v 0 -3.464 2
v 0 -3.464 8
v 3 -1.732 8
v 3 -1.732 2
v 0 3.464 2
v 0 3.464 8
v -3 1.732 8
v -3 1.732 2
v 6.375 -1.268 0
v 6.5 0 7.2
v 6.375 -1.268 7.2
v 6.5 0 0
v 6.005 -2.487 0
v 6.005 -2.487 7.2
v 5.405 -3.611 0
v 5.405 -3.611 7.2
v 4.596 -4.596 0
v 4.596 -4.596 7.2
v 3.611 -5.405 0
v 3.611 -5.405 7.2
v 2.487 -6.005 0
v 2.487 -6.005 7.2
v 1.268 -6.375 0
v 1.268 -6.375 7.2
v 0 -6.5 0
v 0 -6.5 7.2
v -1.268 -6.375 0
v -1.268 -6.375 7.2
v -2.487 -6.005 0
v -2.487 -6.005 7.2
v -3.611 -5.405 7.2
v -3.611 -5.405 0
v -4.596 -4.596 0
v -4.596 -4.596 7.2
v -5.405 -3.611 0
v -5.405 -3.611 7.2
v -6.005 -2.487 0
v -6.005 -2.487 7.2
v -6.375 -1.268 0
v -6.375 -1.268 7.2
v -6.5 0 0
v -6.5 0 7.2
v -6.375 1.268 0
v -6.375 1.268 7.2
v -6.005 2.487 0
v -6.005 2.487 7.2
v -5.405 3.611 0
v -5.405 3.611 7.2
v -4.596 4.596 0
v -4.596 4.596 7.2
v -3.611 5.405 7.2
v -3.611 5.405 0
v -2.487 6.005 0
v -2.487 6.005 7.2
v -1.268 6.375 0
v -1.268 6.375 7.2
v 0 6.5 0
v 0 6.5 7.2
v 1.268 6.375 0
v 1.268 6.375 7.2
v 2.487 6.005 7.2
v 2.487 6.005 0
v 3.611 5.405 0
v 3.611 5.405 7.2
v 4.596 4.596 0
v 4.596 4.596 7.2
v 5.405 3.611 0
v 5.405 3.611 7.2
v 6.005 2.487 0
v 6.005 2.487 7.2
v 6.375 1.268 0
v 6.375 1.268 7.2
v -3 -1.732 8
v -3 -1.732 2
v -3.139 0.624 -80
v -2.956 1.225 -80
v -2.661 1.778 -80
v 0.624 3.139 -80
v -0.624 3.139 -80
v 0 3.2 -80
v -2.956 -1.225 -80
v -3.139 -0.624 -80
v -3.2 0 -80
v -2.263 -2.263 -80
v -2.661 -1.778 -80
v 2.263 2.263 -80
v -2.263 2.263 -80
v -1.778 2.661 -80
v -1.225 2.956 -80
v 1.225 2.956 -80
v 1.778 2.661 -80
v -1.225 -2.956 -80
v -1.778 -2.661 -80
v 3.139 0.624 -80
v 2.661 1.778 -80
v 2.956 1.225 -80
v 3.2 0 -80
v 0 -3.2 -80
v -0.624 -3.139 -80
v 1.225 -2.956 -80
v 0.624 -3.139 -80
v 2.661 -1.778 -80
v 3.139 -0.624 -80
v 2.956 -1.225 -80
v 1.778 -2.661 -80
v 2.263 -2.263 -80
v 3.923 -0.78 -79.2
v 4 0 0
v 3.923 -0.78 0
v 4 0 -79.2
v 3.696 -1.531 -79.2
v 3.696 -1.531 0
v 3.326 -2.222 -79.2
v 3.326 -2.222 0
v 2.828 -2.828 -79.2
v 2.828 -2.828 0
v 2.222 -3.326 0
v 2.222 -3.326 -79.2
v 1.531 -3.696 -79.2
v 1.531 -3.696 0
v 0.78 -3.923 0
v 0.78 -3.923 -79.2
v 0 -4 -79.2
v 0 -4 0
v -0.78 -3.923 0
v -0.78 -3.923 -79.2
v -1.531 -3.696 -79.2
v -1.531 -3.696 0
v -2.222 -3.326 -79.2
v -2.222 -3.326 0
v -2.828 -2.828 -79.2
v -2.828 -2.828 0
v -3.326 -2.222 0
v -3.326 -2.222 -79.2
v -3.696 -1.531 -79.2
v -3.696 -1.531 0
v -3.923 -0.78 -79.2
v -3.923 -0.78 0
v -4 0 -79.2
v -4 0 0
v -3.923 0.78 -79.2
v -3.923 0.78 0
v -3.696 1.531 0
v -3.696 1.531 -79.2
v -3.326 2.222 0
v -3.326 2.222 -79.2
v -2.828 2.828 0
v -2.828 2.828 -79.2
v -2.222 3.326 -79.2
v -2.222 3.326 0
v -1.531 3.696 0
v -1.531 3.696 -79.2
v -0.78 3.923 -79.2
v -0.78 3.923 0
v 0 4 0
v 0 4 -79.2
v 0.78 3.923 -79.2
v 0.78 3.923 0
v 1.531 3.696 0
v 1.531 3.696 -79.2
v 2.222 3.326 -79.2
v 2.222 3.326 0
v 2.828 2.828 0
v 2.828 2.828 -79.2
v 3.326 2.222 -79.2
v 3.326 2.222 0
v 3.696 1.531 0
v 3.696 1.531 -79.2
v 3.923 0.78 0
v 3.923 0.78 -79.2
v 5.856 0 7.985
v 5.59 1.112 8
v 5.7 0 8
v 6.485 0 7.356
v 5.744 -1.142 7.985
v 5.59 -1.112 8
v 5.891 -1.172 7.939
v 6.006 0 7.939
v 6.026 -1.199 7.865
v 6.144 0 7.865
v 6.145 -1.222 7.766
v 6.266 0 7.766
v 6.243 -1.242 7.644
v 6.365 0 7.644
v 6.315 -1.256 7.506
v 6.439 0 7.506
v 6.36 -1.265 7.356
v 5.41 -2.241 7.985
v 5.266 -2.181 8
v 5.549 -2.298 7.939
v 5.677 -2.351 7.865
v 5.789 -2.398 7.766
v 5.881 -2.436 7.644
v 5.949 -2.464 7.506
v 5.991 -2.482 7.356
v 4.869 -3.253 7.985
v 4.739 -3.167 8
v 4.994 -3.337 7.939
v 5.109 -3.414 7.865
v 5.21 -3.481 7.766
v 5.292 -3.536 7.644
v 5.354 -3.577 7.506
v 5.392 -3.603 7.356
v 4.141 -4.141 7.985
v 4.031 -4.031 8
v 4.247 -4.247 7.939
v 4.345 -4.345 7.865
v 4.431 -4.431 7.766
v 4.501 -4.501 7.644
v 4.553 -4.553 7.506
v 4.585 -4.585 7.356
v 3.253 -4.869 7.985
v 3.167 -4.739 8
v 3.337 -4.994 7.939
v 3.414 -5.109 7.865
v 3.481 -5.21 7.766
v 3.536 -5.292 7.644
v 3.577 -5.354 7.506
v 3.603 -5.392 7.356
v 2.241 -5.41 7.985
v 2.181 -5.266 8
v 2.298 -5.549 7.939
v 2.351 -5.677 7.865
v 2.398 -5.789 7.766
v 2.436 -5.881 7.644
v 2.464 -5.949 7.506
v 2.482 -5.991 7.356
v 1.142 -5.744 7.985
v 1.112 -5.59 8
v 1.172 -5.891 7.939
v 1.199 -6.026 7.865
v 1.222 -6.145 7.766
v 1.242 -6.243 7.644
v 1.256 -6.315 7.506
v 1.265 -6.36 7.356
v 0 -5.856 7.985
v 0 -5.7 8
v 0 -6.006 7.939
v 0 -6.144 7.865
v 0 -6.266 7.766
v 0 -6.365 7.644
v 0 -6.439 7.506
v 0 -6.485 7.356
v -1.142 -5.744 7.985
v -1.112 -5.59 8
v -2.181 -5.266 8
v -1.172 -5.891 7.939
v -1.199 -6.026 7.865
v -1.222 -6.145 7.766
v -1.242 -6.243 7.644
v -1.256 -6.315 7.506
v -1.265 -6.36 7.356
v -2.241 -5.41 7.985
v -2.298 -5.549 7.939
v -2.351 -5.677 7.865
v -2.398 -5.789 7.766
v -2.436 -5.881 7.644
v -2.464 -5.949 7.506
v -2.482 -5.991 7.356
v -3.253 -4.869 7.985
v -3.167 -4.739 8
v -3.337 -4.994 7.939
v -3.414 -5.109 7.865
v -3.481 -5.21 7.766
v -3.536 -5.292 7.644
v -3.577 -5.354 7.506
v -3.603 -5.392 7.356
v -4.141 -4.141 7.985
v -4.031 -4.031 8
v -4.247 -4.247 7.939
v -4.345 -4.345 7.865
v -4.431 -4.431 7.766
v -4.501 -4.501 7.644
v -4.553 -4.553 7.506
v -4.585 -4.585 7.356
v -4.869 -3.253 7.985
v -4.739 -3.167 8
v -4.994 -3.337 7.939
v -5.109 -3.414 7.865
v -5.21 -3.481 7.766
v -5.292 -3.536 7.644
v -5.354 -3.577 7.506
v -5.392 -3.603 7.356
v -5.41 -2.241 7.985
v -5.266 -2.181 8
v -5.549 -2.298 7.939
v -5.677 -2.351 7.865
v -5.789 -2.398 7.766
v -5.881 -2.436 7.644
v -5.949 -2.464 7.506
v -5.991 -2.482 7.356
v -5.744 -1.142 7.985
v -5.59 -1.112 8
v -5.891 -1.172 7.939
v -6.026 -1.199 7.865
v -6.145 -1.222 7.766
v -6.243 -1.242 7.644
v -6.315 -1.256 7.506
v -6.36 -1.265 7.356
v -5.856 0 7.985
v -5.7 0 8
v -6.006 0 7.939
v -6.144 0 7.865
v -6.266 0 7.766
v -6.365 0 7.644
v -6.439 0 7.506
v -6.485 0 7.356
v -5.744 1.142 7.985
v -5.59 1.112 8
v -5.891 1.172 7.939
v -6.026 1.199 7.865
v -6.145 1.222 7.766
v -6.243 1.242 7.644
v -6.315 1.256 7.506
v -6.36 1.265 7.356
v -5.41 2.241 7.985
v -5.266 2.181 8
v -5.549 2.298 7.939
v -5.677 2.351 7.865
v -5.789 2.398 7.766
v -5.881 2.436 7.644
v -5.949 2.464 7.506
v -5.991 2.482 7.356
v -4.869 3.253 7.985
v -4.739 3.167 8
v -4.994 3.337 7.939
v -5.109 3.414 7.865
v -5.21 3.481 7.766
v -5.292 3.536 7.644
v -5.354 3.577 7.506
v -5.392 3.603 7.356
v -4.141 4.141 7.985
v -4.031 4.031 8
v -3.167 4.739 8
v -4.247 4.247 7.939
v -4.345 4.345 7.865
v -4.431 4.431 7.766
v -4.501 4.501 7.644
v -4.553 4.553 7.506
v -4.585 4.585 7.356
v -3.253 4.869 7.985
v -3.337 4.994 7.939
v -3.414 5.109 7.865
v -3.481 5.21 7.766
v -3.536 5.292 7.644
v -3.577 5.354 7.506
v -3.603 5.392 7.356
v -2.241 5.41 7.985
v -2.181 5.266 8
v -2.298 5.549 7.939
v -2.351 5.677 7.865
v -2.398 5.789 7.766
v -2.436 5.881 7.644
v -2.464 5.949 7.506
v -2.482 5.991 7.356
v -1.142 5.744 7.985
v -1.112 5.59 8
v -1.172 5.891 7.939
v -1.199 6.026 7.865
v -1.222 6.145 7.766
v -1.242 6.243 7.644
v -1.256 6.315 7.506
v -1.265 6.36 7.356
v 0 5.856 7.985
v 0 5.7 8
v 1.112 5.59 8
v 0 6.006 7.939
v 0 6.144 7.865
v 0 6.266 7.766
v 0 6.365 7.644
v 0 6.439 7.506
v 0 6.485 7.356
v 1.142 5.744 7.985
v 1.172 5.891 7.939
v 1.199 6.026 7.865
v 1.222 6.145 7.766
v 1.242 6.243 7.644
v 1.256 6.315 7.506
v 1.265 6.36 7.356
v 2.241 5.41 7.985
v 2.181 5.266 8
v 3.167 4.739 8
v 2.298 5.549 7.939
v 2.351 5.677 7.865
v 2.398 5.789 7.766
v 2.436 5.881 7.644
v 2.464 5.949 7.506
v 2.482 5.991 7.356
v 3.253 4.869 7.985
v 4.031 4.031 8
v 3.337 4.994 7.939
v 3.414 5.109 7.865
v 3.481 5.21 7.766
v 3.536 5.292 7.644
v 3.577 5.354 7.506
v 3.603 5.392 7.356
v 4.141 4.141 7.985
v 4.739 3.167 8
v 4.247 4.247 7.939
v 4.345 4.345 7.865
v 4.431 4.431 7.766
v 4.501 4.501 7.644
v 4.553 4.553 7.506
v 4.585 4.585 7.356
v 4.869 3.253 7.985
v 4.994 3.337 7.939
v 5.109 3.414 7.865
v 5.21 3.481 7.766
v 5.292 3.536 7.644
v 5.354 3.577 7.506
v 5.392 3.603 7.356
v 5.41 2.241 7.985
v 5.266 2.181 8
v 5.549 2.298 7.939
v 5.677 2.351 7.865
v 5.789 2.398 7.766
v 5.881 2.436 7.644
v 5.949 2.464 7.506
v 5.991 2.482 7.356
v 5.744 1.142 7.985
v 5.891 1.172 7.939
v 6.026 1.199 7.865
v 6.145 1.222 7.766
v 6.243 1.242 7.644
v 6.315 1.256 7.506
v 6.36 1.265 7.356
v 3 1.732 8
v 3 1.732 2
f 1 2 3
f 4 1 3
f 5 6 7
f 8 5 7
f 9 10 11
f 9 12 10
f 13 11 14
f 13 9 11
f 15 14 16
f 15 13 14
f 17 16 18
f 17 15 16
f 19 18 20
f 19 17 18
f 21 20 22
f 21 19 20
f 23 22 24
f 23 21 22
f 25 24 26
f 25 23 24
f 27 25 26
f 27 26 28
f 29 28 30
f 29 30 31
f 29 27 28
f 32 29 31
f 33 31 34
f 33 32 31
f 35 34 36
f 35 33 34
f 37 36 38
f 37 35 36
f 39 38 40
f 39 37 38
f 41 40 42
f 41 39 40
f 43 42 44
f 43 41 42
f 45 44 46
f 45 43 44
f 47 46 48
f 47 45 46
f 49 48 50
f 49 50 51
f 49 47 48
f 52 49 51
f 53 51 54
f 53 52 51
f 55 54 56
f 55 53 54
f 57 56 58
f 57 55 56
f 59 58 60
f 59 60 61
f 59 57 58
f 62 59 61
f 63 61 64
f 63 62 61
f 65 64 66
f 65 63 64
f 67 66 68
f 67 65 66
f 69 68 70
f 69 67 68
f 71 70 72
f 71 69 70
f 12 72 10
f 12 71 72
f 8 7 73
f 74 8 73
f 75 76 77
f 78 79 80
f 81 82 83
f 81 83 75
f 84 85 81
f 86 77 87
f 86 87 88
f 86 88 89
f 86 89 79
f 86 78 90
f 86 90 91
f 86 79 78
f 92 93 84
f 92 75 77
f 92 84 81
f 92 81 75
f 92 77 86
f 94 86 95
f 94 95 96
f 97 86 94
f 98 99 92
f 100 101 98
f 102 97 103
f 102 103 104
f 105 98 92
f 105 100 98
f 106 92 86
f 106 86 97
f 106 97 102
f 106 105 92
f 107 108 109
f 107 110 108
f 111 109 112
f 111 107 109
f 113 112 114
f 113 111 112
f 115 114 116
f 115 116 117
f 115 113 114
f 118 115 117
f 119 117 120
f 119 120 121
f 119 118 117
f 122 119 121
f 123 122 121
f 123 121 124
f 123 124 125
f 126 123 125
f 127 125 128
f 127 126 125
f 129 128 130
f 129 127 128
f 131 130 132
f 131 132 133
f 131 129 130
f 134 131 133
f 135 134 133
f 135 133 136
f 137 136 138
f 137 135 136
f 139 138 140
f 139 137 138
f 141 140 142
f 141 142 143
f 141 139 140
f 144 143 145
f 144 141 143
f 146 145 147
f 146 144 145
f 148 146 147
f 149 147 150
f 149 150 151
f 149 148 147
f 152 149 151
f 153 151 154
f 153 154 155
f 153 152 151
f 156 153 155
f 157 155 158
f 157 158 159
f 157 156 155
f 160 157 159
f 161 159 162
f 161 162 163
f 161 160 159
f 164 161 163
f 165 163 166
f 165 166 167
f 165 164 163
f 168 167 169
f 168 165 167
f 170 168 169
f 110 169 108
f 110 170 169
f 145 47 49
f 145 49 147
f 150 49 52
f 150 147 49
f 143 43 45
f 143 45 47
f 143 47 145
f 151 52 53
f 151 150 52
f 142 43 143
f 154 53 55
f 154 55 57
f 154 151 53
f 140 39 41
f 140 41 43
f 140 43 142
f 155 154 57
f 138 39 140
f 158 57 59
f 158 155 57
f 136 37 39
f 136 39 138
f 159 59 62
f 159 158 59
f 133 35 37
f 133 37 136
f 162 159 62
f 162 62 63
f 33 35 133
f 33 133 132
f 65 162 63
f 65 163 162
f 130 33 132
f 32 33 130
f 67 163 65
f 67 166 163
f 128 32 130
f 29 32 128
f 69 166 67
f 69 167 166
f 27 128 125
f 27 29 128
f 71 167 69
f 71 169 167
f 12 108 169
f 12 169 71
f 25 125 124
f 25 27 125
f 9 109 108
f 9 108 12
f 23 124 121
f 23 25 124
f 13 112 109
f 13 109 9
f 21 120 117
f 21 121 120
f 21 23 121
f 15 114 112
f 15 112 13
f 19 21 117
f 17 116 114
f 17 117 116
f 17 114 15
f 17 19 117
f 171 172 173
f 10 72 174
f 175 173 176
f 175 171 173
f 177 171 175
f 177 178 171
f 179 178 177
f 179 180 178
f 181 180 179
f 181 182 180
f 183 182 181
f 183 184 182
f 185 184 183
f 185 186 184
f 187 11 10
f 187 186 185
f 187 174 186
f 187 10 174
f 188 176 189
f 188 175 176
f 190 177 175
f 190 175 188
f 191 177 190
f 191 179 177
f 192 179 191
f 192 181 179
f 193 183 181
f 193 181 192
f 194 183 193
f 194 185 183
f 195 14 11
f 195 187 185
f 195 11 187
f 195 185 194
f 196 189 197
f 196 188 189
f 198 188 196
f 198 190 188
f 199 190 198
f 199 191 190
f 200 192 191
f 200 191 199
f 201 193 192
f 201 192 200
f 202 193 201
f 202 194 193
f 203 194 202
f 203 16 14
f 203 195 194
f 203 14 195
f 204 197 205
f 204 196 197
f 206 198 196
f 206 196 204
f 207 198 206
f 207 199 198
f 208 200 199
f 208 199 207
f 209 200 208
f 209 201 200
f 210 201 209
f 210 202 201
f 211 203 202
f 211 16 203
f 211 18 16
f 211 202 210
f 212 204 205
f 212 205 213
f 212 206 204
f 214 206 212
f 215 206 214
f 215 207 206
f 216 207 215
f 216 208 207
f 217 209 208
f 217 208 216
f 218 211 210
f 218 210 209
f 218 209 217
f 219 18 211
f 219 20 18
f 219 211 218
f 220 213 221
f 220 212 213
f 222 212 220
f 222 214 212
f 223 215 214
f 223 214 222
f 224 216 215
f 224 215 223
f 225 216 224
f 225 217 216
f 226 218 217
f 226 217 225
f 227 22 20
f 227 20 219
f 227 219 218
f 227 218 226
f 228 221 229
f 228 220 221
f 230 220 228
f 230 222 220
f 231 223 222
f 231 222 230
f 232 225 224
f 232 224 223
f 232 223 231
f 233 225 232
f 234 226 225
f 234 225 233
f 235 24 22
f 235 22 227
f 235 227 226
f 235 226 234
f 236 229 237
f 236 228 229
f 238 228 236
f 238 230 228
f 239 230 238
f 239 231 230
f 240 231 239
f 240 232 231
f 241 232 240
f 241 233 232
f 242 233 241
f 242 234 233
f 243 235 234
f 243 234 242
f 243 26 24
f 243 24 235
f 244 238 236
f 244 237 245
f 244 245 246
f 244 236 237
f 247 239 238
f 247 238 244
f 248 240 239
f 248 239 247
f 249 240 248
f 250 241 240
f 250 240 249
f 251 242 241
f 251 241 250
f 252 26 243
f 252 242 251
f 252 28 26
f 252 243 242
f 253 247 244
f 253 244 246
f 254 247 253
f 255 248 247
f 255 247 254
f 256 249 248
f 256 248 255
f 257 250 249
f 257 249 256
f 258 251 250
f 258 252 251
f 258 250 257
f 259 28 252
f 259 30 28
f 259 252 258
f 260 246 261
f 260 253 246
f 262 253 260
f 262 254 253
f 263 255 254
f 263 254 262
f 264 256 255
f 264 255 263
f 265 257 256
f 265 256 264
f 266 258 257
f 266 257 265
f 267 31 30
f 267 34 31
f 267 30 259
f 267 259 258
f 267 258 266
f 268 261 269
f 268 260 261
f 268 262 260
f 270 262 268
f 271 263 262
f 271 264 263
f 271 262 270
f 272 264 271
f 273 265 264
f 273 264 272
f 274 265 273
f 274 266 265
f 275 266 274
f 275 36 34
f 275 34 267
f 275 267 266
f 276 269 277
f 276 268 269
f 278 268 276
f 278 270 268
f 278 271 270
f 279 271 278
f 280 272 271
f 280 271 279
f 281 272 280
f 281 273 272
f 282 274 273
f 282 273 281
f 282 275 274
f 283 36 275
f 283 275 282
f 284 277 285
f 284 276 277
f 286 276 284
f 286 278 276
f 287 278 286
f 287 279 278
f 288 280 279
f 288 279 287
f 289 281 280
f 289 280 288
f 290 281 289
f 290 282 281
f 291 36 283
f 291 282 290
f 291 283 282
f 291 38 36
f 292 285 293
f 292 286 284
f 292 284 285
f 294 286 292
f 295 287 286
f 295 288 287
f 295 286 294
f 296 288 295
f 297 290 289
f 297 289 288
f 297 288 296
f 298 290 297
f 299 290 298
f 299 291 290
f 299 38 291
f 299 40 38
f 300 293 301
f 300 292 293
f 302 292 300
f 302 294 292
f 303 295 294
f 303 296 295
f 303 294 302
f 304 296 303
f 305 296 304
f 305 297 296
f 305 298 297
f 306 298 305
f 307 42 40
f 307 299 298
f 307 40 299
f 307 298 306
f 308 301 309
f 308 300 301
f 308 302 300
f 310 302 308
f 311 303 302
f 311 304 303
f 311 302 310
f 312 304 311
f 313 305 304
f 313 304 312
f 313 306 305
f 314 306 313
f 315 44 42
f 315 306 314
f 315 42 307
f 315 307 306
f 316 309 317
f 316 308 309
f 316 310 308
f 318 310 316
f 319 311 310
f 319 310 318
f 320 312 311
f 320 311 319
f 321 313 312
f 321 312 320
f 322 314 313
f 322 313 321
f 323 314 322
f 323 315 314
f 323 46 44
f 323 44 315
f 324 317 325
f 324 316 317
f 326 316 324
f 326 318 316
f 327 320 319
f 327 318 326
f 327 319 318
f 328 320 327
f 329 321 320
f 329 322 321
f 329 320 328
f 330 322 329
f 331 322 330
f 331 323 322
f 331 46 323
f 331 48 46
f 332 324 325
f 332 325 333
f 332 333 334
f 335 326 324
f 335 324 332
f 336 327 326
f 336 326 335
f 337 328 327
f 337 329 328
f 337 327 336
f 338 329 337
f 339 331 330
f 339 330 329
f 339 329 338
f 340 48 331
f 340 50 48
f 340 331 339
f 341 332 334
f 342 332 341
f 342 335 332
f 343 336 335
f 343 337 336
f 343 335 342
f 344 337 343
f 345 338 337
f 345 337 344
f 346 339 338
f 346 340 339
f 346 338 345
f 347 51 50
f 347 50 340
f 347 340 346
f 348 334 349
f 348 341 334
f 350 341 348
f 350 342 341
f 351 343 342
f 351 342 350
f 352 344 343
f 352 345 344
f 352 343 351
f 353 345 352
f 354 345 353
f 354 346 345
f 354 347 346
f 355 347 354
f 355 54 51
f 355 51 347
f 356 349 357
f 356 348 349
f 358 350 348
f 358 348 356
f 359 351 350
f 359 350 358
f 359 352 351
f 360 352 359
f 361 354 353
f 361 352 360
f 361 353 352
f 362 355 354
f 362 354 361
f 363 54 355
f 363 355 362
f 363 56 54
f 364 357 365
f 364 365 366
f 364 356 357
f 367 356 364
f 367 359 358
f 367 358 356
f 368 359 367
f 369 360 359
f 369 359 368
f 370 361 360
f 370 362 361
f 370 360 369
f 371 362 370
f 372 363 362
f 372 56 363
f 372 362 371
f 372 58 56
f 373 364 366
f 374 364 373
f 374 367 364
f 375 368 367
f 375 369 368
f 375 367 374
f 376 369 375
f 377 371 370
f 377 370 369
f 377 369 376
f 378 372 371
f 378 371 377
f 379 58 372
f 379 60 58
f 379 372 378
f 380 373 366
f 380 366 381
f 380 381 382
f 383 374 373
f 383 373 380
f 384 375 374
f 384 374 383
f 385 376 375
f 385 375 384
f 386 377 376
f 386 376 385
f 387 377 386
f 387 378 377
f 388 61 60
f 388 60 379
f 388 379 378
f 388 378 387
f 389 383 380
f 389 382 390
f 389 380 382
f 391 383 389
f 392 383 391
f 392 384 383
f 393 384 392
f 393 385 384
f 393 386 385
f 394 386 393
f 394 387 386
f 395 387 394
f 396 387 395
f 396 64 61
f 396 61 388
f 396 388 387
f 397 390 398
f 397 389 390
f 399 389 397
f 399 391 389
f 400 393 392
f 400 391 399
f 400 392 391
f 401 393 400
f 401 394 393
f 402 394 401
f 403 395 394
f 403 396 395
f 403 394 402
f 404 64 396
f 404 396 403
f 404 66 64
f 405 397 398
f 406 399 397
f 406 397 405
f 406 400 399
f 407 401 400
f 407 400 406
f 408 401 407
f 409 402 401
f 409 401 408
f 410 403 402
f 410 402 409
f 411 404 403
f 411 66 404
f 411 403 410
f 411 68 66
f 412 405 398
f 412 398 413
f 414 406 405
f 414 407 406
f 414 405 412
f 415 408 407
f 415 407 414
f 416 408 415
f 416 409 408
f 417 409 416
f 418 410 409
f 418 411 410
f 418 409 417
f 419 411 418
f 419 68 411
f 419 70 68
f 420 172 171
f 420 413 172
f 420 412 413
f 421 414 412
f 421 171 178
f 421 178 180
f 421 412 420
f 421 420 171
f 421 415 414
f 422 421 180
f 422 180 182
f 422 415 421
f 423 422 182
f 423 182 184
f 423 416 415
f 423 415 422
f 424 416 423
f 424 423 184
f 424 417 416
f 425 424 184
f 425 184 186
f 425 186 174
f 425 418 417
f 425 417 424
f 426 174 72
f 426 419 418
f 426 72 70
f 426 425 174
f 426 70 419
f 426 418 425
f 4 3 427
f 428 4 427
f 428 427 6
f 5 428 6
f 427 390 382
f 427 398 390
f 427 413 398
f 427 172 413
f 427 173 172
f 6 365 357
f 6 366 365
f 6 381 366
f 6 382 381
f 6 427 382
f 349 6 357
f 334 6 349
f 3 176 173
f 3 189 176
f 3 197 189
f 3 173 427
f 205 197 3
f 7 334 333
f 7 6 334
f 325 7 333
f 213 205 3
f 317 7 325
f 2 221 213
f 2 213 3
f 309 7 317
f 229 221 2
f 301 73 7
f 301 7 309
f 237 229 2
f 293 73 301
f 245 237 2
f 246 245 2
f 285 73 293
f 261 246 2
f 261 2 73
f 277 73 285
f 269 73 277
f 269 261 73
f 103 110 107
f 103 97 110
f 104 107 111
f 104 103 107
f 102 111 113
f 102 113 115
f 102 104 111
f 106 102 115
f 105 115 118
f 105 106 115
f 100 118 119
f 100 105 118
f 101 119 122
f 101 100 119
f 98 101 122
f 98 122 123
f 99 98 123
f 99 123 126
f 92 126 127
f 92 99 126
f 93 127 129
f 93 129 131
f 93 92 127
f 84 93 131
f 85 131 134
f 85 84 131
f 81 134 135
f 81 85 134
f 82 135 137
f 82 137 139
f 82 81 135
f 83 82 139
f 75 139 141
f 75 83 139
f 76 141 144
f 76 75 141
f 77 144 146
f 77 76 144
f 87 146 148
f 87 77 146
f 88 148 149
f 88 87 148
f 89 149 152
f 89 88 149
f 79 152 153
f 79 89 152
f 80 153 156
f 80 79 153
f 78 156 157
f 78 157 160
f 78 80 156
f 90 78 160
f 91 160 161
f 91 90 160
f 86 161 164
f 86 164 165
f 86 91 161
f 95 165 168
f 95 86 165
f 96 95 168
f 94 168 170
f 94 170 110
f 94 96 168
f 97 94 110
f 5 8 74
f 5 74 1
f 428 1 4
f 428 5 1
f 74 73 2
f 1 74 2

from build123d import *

# Parameters (mm, degrees)
ODEBR_N_PROTA_EN_1_DEPTH = 6


with BuildPart() as part:
    # Skica1 → Základ-Rotační (revolve)
    with BuildSketch(Plane(origin=(0, 0, 0), x_dir=(1, 0, 0), z_dir=(0, 1, 0))):
        with BuildLine():
            Line((0, 80), (0, -8))
            Line((0, -8), (5.7, -8))
            ThreePointArc((5.7, -8), (6.265685425, -7.765685425), (6.5, -7.2))
            Line((6.5, -7.2), (6.5, 0))
            Line((6.5, 0), (4, 0))
            Line((4, 0), (4, 79.2))
            Line((4, 79.2), (3.2, 80))
            Line((3.2, 80), (0, 80))
        make_face()
    revolve(axis=Axis((0, 0, -20.555484665), (0, 0, -1)))

    # Skica2 → Odebrání-Protažení1 (cut)
    with BuildSketch(Plane.XY.offset(8)):
        Polygon((3, -1.732050808), (3, 1.732050808), (0, 3.464101615), (-3, 1.732050808), (-3, -1.732050808), (0, -3.464101615), align=None)
    extrude(amount=-ODEBR_N_PROTA_EN_1_DEPTH, mode=Mode.SUBTRACT)


solid = part.part
